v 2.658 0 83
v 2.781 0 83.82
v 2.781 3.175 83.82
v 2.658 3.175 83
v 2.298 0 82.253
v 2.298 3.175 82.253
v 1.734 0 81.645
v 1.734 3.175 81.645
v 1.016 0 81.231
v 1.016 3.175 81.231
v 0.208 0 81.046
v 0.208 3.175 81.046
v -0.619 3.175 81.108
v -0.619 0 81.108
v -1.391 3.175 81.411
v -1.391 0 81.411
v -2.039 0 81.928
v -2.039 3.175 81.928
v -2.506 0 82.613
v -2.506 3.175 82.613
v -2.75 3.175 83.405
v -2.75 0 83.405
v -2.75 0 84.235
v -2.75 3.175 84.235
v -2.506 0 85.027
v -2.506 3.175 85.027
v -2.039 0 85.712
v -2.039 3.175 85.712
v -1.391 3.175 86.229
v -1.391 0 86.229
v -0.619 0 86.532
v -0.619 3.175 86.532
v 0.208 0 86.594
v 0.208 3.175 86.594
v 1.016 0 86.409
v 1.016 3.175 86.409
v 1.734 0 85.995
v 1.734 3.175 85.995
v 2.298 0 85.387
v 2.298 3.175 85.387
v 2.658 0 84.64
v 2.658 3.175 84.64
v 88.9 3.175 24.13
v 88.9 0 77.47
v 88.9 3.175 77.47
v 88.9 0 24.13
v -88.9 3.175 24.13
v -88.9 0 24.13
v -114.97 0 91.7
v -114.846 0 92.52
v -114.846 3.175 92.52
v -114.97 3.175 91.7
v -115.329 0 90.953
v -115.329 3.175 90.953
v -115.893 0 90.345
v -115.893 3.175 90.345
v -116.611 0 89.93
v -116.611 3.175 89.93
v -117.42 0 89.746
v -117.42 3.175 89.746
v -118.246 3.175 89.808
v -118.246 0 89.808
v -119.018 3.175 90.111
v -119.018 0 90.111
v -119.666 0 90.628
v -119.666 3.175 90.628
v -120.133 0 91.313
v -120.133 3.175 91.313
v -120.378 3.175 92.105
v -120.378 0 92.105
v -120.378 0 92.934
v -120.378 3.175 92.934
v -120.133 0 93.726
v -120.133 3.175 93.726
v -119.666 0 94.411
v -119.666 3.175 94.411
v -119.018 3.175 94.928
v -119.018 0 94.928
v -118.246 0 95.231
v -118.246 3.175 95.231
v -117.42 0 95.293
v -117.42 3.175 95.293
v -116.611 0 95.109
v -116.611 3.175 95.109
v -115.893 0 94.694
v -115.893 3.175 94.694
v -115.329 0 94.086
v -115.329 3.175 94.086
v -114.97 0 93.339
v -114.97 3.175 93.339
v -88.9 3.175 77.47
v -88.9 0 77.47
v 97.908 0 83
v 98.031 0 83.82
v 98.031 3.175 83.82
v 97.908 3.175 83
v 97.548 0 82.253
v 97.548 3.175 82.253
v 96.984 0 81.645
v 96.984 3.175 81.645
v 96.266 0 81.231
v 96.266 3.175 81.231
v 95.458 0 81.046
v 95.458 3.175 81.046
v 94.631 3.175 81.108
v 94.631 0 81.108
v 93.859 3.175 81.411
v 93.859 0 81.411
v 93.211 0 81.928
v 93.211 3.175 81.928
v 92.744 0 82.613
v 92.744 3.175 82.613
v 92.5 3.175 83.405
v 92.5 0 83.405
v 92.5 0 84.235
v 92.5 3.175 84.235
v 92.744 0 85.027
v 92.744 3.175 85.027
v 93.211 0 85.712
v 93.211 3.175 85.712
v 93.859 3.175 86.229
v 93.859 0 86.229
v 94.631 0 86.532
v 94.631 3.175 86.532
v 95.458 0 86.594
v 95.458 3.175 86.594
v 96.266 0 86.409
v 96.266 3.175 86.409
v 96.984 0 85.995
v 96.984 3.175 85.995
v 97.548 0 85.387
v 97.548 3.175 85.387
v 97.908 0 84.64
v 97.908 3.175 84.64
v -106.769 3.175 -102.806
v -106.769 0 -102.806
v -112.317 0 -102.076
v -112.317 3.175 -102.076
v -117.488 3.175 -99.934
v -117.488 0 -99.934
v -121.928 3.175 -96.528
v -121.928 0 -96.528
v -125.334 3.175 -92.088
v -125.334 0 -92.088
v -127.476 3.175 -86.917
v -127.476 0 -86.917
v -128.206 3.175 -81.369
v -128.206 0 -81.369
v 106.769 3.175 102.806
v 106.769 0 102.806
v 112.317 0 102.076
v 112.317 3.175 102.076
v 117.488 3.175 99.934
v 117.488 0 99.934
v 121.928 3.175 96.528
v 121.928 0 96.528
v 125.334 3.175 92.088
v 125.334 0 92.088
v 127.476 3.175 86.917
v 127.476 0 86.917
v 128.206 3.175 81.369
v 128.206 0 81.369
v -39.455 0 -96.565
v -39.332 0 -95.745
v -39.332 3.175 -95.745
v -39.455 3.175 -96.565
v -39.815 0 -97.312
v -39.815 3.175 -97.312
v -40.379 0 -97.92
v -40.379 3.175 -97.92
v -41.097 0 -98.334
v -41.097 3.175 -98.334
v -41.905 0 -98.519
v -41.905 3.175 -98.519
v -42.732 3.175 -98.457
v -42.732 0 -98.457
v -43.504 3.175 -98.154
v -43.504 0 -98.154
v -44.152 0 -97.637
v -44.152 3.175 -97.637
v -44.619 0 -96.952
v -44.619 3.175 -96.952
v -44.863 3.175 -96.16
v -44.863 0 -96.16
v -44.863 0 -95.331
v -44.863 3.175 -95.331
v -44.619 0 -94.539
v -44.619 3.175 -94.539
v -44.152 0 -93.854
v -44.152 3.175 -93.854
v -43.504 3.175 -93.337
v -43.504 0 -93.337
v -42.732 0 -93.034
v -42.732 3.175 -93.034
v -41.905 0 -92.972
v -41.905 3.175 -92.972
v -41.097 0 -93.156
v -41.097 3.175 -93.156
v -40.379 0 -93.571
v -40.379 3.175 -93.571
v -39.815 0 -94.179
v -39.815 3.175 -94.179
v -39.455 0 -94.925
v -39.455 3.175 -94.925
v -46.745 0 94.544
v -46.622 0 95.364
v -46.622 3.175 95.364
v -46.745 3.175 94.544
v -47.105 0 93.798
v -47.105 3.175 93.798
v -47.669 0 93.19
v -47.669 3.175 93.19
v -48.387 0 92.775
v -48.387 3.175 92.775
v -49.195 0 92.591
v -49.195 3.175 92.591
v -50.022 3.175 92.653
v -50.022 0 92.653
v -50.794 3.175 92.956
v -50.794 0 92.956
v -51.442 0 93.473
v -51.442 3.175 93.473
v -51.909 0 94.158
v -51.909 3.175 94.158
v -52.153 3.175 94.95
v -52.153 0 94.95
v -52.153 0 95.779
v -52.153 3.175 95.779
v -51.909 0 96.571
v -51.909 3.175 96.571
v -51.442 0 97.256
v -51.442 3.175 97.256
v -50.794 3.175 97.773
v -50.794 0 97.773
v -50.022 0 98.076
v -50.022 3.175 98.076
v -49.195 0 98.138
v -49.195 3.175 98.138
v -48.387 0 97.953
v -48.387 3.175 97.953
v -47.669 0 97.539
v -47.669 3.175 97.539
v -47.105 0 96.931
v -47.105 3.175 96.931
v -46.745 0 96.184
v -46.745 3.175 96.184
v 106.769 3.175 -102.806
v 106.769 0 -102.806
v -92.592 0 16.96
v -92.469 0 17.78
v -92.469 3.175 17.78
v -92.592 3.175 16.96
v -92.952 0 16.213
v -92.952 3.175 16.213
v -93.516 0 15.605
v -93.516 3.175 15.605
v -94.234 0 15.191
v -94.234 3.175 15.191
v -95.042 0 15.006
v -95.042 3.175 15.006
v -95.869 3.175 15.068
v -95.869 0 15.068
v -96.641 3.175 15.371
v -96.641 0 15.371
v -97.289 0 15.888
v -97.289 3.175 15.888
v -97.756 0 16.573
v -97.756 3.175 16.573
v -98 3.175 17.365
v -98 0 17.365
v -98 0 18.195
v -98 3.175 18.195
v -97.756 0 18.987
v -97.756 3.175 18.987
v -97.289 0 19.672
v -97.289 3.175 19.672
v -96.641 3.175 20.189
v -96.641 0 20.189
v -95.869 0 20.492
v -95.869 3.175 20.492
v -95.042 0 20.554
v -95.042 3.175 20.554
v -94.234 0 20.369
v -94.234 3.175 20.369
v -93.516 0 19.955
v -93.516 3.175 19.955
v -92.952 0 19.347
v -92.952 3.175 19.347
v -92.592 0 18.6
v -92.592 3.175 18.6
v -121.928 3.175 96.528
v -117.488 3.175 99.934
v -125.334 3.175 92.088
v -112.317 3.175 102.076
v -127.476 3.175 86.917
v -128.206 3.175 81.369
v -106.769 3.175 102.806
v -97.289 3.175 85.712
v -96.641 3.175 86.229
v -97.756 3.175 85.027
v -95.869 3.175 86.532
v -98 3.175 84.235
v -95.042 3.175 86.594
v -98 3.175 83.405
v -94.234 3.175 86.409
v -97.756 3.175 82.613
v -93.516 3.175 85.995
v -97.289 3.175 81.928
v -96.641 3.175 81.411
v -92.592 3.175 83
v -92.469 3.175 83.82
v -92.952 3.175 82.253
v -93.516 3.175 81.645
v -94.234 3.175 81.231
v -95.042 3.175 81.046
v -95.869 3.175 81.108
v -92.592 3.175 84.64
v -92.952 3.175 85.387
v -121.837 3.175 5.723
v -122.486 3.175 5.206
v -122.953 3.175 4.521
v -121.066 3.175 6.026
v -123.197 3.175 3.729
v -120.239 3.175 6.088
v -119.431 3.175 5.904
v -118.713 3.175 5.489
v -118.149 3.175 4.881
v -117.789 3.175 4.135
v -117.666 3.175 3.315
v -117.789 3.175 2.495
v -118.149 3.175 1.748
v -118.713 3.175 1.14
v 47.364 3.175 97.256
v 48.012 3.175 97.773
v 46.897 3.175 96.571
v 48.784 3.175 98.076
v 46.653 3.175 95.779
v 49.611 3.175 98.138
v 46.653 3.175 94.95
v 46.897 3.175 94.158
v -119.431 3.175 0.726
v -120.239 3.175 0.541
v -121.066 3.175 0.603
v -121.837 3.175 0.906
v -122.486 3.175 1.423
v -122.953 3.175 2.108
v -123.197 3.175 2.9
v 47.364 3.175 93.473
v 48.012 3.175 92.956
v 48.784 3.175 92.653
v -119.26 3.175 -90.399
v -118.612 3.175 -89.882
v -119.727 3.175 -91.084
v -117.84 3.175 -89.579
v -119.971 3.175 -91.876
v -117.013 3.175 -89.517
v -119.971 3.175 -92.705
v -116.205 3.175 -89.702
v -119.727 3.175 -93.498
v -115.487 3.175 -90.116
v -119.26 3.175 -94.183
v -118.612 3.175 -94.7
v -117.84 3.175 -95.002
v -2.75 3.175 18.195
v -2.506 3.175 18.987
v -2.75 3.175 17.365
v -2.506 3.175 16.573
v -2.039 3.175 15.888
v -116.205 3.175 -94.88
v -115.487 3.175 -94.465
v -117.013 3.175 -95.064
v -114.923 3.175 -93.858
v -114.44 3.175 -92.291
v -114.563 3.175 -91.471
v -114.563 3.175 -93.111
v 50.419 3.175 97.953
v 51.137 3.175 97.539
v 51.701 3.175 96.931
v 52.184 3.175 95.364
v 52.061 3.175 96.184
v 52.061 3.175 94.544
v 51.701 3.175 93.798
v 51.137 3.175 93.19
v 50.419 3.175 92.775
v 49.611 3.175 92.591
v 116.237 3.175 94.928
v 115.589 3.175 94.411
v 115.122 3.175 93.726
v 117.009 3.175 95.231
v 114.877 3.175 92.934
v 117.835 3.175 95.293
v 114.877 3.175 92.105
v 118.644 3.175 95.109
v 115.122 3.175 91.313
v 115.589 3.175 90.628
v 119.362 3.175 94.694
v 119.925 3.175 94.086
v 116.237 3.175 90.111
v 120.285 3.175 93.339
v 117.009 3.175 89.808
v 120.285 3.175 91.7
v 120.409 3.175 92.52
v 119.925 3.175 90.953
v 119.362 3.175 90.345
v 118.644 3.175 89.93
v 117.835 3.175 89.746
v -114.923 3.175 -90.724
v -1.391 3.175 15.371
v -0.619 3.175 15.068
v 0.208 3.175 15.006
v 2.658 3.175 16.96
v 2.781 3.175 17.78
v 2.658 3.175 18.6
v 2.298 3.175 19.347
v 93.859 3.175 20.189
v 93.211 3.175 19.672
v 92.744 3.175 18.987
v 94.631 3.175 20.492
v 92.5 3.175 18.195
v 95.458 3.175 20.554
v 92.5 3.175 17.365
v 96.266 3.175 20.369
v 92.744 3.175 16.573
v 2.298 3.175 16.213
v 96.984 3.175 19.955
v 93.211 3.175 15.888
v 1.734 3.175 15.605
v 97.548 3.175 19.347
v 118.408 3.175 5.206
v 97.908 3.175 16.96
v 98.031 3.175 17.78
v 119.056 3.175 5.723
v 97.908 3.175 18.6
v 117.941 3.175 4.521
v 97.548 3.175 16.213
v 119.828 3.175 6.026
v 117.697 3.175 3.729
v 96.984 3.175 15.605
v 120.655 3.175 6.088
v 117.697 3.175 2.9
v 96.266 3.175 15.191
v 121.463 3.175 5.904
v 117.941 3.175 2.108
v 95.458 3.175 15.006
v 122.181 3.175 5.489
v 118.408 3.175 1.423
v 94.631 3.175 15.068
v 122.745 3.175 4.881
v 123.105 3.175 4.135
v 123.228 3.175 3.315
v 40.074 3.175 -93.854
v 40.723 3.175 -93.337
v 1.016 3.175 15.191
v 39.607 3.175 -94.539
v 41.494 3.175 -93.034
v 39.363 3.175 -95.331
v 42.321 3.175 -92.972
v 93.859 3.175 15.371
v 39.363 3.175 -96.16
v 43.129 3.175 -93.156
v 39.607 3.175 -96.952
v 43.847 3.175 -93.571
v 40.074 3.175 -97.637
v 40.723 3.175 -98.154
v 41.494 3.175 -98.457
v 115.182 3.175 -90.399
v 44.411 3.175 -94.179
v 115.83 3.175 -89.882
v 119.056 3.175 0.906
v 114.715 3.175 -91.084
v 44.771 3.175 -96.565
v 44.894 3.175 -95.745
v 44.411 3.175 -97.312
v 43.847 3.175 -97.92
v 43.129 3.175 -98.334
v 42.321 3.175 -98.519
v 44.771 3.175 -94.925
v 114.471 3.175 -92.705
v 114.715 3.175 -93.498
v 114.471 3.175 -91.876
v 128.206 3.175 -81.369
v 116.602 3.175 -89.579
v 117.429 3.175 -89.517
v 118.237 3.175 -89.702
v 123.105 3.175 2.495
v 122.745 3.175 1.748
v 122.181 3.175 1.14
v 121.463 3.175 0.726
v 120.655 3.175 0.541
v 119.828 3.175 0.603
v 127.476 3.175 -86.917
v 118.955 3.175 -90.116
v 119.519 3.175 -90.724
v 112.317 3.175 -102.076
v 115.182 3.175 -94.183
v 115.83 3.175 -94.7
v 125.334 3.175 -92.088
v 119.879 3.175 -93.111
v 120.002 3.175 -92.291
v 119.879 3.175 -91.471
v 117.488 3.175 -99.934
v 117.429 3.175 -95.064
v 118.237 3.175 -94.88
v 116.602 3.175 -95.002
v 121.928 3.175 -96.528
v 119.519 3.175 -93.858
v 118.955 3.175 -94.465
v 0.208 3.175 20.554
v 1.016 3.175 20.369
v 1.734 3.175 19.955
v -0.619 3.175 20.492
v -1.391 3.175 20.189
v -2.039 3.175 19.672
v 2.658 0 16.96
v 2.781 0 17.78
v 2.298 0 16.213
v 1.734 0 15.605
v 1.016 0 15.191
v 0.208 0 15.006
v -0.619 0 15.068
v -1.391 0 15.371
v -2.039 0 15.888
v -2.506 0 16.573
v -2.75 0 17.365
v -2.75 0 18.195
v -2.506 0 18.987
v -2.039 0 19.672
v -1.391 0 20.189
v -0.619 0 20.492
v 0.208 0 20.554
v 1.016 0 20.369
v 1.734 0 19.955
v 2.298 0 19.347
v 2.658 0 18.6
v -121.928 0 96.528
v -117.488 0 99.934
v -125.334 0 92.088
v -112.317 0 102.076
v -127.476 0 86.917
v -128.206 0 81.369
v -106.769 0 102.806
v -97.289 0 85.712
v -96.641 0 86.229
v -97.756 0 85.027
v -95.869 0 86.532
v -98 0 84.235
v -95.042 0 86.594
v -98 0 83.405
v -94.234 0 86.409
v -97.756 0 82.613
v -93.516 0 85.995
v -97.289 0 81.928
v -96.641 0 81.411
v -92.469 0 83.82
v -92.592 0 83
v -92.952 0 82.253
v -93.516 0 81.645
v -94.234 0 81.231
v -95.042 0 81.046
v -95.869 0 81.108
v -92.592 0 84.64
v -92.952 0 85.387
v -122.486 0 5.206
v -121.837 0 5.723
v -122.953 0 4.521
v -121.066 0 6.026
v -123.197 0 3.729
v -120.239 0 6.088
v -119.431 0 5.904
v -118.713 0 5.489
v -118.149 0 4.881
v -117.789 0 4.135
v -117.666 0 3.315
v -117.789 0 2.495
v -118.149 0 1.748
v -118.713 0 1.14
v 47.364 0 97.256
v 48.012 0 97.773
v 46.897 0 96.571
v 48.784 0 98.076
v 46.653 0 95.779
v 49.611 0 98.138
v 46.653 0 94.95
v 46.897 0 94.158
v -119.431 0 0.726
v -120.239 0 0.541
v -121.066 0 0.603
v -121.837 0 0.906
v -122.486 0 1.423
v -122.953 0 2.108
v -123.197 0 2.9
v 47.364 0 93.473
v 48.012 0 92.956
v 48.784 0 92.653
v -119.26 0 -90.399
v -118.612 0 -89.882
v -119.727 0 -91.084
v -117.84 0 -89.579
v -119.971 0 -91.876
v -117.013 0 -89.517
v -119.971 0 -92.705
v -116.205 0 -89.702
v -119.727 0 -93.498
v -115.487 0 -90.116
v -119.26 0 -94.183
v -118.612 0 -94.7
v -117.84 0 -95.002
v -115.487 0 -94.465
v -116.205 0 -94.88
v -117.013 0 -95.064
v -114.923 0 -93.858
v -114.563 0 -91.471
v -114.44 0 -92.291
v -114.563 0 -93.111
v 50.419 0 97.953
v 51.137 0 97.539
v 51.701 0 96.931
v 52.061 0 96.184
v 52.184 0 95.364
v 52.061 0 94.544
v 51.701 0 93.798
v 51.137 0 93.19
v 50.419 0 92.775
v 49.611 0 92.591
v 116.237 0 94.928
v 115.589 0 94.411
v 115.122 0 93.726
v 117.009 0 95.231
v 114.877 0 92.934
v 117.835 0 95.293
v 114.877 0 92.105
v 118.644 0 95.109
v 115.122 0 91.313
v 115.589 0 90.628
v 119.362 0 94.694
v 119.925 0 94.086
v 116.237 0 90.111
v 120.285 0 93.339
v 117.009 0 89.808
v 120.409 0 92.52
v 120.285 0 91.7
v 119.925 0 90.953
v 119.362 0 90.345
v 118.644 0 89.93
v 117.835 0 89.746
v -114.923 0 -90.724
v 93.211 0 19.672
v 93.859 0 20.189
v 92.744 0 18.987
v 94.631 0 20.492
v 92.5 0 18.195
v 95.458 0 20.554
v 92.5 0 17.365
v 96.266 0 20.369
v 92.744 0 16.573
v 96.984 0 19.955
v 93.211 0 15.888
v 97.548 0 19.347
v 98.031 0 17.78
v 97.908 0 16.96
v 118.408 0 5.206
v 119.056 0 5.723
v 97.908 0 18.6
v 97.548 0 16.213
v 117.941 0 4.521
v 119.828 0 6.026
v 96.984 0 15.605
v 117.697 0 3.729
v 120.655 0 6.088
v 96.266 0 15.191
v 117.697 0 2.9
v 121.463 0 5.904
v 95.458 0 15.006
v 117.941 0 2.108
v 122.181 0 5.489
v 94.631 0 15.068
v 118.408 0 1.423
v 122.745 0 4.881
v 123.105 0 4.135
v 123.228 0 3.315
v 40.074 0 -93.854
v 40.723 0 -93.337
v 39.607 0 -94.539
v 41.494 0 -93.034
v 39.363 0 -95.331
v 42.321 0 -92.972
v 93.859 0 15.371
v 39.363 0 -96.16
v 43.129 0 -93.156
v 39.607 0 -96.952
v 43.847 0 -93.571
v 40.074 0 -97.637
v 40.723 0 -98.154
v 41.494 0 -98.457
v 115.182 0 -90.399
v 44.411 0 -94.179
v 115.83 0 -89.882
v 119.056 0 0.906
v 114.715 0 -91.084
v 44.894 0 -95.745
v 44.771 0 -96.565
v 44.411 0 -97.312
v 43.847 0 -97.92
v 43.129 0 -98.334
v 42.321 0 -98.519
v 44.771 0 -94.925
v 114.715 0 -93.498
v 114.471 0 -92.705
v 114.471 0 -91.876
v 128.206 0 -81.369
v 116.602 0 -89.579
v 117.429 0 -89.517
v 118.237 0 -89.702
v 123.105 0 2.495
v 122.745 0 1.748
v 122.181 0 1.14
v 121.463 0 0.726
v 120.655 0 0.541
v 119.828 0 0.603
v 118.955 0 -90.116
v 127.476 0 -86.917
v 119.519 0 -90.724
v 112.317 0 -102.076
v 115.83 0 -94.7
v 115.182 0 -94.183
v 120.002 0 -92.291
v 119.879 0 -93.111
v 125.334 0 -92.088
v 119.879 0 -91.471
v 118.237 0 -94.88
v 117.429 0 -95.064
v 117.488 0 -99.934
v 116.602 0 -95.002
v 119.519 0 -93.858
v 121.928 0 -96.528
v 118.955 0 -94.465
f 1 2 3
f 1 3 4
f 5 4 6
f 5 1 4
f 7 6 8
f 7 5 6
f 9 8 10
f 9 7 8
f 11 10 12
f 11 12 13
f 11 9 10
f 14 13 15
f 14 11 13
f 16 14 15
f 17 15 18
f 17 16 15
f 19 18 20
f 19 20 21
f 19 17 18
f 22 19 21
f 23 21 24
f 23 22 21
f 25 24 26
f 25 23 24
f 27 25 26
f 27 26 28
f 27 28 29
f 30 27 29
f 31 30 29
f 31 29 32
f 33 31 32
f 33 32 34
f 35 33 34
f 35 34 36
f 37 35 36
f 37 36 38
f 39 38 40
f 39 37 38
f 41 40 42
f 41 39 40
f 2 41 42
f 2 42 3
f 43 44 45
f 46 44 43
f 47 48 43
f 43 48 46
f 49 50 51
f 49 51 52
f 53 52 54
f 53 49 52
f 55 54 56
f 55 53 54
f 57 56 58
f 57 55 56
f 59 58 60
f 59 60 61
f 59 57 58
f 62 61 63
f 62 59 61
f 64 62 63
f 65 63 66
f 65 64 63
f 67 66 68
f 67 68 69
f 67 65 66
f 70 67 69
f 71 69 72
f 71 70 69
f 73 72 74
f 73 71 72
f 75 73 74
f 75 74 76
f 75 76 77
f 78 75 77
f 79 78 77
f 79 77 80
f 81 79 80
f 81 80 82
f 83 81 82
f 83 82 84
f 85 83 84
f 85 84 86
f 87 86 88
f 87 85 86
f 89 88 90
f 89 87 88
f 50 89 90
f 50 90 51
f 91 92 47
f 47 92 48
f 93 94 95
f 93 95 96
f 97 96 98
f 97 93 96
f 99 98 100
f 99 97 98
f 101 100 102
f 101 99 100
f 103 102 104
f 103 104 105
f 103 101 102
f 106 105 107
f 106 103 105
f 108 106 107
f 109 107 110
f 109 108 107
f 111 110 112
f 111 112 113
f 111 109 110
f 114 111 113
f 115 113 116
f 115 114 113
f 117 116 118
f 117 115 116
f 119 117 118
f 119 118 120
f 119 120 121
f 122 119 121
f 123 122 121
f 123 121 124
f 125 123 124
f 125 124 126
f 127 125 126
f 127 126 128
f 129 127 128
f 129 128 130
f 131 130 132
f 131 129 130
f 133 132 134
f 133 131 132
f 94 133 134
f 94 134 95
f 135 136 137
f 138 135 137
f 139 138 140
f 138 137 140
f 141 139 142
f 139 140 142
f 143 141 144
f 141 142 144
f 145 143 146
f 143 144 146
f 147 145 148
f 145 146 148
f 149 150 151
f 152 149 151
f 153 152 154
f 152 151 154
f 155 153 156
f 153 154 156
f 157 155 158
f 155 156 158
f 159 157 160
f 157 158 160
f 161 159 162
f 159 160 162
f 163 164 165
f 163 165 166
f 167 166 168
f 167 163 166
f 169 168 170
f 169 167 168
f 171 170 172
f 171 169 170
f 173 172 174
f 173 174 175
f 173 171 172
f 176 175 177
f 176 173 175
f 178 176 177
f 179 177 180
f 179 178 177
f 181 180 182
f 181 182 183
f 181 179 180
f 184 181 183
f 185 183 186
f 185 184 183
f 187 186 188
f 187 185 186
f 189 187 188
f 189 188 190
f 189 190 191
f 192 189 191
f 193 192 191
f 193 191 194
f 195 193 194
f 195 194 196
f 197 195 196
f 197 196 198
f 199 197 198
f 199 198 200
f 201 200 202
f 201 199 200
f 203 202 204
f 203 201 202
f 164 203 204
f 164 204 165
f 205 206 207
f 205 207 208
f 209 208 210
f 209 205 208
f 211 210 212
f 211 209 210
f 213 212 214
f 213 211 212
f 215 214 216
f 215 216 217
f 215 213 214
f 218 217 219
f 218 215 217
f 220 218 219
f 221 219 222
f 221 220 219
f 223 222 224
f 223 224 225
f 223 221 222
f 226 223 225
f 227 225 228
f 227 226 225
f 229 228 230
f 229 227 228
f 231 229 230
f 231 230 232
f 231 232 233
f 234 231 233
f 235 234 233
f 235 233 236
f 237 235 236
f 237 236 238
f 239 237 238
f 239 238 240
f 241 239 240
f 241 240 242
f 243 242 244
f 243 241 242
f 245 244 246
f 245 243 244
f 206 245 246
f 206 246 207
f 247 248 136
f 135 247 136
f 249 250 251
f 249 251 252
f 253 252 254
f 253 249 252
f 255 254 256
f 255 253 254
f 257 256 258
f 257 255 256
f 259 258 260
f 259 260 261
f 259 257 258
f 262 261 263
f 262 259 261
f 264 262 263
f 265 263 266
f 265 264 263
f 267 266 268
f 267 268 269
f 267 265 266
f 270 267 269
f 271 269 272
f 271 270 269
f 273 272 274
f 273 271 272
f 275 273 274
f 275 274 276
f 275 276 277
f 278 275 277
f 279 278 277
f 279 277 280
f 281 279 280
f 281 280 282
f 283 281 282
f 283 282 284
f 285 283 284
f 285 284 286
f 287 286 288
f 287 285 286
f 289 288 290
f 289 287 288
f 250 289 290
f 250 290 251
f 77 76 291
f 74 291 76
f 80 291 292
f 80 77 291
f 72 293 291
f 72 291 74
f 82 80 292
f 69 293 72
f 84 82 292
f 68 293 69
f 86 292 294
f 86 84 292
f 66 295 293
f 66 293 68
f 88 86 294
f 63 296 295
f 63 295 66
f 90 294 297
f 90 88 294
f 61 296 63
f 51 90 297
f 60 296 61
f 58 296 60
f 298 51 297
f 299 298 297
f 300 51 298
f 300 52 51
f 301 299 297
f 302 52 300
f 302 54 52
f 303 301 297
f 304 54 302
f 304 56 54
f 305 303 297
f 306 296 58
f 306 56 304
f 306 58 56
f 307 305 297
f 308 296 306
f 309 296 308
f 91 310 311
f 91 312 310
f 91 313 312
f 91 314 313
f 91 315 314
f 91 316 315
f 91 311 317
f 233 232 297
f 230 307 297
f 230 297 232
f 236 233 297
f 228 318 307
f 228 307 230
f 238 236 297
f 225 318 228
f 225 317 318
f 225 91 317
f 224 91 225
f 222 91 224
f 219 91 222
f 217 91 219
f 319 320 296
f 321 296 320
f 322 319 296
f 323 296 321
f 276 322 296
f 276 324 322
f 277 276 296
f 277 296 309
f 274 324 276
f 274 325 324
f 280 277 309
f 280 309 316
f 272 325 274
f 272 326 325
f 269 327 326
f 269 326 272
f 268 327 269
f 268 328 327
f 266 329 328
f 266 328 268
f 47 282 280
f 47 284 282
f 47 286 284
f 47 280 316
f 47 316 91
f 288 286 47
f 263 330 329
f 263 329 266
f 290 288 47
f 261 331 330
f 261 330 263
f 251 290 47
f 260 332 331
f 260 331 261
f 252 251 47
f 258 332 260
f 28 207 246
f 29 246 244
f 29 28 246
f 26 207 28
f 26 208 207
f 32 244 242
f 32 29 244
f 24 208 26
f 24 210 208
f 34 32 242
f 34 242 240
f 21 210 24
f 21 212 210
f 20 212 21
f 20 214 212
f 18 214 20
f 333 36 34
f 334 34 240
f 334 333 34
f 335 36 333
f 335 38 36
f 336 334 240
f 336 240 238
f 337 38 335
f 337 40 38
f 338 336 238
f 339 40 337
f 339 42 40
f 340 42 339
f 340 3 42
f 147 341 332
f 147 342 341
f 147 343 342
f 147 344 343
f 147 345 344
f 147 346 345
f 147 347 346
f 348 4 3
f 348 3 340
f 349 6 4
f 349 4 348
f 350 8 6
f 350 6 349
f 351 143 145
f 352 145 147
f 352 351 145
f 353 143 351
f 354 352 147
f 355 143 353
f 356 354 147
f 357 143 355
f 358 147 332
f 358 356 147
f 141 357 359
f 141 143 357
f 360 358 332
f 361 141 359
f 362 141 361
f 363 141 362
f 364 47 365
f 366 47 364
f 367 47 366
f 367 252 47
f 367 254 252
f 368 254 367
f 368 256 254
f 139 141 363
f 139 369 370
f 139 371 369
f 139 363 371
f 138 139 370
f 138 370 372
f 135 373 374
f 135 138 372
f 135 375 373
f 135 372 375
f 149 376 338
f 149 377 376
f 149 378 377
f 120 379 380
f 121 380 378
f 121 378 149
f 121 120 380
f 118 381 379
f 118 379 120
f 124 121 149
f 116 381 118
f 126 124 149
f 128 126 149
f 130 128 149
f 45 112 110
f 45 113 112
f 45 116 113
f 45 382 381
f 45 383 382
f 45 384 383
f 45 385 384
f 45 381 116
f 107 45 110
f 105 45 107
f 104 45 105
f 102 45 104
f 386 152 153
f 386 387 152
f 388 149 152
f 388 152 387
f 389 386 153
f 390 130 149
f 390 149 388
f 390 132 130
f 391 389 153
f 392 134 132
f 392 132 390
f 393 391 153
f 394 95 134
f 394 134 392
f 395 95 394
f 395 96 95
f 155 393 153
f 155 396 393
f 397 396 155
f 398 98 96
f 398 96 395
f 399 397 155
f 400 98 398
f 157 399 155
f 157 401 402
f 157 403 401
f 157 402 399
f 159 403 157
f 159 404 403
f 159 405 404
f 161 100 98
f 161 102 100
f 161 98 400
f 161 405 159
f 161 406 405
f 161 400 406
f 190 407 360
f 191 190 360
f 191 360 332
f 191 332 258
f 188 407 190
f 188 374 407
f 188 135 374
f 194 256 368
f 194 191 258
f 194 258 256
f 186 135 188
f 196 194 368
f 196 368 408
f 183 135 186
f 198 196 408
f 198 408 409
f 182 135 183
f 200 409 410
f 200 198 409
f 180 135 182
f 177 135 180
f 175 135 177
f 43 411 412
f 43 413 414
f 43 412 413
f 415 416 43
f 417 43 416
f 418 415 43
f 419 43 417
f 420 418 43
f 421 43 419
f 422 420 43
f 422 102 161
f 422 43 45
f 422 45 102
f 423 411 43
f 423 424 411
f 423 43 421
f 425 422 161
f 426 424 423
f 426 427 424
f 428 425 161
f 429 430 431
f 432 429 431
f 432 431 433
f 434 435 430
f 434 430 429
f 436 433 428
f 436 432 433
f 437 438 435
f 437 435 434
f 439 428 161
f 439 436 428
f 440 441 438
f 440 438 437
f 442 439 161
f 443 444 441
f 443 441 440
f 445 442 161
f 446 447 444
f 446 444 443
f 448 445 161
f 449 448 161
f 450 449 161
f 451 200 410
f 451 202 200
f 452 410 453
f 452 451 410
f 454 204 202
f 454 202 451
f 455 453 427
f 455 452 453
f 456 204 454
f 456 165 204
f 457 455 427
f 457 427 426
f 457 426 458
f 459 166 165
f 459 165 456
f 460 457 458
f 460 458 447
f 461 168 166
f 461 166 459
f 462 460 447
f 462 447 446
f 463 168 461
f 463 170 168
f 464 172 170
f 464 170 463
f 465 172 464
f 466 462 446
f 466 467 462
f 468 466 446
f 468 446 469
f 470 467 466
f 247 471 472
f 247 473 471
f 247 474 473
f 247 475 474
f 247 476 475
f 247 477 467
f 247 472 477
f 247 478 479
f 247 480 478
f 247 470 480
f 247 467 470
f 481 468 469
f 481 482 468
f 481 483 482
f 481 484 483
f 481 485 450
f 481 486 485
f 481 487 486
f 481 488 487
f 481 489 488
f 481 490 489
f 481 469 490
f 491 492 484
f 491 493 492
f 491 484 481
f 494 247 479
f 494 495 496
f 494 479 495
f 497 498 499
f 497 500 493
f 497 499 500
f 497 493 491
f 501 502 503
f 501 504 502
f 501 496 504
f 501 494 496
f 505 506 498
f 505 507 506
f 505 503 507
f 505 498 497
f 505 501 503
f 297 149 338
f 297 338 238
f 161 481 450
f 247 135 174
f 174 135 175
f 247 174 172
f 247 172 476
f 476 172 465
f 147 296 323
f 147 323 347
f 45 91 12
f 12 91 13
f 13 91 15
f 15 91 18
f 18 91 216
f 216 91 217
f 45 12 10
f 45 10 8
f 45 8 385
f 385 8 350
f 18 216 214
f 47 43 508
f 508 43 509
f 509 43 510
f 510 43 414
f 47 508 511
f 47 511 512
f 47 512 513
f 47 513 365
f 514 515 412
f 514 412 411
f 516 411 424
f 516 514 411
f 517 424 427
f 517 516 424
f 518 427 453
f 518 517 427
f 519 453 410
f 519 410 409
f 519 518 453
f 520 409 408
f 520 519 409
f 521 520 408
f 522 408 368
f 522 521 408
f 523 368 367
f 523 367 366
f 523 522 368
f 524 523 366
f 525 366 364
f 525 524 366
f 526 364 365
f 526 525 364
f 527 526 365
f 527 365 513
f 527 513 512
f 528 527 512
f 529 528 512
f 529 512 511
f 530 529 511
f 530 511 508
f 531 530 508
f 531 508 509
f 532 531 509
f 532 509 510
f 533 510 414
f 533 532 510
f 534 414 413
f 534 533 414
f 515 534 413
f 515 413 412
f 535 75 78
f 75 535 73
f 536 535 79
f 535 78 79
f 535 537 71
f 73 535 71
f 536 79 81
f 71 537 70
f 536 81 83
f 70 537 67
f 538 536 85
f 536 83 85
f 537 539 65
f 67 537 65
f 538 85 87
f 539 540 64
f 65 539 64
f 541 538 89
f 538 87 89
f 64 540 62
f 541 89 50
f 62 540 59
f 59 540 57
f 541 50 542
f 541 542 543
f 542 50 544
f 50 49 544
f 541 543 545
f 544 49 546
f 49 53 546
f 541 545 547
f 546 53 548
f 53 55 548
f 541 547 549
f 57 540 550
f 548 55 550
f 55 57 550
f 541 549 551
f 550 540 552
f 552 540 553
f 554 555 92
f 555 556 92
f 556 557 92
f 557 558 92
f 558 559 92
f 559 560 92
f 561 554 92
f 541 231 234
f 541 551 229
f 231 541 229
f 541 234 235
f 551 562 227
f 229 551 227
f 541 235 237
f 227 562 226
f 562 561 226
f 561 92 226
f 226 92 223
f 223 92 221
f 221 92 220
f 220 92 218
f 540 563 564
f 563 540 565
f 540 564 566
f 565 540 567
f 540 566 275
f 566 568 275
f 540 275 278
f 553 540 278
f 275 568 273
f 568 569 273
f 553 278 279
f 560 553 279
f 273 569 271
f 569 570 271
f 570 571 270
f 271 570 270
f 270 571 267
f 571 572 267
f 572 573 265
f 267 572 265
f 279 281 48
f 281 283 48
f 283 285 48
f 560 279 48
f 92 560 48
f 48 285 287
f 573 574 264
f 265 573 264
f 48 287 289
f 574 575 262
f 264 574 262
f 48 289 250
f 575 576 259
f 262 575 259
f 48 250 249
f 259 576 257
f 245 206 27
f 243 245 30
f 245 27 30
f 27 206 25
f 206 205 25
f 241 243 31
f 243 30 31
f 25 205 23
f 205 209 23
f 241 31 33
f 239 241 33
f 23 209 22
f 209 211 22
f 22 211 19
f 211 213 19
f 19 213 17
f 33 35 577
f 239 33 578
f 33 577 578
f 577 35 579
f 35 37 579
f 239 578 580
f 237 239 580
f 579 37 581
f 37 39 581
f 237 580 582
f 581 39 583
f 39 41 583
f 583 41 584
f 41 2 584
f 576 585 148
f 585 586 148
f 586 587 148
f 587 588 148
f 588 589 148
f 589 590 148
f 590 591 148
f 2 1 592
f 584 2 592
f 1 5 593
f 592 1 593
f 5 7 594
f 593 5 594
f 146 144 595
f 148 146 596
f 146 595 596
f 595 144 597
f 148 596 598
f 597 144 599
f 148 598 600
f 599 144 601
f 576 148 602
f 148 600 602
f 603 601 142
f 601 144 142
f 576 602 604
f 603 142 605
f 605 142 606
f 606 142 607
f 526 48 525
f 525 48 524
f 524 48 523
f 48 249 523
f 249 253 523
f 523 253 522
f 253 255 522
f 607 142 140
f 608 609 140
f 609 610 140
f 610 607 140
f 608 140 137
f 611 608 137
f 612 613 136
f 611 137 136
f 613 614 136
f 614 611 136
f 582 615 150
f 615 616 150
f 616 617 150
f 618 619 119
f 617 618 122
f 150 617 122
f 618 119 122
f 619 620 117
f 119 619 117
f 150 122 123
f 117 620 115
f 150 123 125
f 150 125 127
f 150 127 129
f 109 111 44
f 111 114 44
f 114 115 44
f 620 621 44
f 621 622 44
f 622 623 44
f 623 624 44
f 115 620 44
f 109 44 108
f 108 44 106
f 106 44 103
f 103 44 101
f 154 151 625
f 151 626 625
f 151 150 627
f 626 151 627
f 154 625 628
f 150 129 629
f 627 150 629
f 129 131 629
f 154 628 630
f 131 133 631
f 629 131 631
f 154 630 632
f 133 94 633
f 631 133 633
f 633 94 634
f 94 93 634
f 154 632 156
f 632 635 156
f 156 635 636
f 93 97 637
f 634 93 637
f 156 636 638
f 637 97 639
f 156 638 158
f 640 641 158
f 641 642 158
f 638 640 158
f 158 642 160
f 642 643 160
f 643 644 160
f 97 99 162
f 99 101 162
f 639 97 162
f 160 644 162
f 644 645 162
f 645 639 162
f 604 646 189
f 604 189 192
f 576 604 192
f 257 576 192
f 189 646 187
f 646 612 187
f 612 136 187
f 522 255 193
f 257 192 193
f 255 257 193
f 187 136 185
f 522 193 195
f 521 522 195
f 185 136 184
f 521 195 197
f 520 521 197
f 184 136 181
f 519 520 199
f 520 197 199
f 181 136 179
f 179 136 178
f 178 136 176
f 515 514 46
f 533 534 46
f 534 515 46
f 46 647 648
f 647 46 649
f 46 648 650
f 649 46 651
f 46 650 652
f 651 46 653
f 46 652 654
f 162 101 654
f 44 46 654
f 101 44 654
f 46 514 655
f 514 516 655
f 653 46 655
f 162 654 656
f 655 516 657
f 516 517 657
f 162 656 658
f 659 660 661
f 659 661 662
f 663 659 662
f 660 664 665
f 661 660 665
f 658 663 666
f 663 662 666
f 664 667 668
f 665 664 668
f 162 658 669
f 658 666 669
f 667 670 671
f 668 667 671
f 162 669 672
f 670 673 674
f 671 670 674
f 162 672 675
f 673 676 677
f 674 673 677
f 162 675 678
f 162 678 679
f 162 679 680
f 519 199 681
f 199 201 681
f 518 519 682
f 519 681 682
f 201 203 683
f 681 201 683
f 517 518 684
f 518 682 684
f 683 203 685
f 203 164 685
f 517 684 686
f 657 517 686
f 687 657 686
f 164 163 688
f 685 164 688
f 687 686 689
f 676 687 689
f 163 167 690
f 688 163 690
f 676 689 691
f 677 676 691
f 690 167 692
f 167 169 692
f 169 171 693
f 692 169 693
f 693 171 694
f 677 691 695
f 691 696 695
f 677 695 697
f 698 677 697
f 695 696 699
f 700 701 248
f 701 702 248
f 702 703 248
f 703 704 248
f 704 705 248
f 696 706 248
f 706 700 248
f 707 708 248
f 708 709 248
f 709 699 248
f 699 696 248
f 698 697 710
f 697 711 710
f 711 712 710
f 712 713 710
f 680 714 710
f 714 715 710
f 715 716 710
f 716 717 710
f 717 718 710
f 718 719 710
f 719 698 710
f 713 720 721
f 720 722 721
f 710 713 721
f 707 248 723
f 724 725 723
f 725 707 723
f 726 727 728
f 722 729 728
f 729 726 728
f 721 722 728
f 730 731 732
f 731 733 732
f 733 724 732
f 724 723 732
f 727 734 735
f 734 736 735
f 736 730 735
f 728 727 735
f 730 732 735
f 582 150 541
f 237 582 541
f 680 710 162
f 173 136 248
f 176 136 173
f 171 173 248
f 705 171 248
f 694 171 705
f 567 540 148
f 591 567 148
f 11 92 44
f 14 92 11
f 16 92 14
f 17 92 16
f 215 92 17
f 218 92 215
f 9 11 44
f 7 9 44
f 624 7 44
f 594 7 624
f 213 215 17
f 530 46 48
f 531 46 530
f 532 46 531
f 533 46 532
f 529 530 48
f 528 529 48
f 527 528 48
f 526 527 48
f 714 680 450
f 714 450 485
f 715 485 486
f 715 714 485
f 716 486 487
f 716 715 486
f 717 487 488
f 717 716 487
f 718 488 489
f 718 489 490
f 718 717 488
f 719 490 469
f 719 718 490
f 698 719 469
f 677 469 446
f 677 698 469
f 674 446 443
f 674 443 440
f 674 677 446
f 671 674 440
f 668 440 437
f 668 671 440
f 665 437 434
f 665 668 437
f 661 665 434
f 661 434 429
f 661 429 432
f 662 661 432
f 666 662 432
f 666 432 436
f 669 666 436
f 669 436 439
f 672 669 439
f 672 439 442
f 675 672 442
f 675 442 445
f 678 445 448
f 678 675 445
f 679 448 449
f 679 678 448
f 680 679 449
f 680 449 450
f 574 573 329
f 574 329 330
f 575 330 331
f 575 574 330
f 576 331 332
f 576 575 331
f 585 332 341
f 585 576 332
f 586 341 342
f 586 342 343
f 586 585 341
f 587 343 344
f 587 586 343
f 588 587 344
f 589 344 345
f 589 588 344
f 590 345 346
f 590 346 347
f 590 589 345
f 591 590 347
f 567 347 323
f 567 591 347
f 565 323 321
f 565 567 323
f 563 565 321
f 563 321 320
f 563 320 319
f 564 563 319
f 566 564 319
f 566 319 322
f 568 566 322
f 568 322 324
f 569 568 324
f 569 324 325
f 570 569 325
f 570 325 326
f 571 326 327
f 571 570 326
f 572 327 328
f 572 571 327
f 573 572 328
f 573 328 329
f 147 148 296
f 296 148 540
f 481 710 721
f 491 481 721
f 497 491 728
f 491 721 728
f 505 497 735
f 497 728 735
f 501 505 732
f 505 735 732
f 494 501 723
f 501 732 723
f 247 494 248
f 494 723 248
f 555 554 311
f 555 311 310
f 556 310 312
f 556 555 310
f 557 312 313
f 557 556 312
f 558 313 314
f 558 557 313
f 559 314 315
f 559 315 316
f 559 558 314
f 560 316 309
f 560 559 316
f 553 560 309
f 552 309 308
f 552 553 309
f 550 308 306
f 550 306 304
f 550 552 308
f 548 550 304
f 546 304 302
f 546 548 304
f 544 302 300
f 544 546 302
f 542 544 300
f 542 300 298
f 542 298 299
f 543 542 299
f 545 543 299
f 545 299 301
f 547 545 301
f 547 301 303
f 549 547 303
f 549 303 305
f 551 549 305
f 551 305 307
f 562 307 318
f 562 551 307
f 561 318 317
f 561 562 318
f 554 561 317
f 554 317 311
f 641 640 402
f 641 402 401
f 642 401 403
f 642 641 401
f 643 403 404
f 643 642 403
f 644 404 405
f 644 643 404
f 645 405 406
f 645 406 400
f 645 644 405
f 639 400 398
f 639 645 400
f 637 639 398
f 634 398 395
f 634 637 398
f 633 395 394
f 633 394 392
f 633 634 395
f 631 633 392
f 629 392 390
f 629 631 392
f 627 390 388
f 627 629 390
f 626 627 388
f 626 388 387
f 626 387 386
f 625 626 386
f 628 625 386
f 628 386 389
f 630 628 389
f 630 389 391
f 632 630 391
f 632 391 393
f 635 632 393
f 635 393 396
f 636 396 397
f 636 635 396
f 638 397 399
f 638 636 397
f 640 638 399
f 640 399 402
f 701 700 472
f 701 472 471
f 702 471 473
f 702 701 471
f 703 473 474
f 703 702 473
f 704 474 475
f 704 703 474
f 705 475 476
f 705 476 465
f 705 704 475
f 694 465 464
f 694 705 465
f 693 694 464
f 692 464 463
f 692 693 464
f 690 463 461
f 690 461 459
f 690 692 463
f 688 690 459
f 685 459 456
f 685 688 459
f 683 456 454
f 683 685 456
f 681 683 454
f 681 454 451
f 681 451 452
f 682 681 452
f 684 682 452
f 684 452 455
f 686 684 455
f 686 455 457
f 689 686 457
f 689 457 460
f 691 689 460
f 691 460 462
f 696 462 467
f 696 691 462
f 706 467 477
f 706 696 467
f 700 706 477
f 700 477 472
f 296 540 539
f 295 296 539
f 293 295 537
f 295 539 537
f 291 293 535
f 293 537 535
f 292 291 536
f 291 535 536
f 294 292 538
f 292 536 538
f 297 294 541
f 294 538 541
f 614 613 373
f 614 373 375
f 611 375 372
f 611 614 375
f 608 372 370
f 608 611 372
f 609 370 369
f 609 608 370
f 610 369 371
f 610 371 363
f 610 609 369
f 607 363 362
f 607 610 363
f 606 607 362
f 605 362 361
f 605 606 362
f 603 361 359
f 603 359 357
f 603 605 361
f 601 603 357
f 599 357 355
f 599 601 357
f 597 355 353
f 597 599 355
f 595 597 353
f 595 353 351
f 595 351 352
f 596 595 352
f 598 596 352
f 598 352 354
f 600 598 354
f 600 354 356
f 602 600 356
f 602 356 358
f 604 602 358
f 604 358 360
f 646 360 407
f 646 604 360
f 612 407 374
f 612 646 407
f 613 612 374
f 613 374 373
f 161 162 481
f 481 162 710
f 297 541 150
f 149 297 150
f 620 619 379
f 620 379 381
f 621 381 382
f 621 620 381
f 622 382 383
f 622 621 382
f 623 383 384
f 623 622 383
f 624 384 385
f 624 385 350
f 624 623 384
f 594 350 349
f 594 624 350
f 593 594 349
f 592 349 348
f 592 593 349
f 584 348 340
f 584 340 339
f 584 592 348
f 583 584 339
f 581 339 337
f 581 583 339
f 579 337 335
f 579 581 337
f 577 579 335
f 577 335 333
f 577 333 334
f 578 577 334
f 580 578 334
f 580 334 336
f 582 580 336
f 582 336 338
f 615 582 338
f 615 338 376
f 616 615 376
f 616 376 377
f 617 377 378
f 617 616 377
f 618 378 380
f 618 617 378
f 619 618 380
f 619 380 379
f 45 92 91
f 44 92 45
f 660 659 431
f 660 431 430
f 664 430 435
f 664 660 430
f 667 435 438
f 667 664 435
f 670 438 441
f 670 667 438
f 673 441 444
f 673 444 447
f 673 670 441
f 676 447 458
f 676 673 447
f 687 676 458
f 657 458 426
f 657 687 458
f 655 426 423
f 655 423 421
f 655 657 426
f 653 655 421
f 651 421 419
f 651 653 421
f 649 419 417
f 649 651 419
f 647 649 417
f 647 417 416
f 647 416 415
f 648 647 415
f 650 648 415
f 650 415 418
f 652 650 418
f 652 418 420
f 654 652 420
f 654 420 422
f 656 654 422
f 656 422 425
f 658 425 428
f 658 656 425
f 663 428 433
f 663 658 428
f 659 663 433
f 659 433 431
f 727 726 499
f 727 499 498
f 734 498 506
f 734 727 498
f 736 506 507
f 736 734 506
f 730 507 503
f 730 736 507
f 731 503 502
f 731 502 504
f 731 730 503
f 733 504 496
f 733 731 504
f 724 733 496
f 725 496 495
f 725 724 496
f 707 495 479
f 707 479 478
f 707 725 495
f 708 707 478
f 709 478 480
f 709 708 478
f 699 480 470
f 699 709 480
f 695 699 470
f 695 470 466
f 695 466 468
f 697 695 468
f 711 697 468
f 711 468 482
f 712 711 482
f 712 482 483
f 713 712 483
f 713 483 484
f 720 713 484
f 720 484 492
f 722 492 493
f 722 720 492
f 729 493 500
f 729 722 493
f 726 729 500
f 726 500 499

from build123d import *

# Parameters (mm, degrees)
SKETCH2_R           = 2.7813
BOSS_EXTRUDE1_DEPTH = 3.175
SKETCH3_W           = 177.8
SKETCH3_H           = 53.34
CUT_EXTRUDE1_DEPTH  = 3.175
SKETCH4_R           = 2.7813
CUT_EXTRUDE2_DEPTH  = 3.175


with BuildPart() as part:
    # Sketch2 → Boss-Extrude1 (new body)
    with BuildSketch(Plane(origin=(0, 0, 0), x_dir=(1, 0, 0), z_dir=(0, 1, 0))):
        with BuildLine():
            Line((-106.7689, -102.8065), (106.7689, -102.8065))
            ThreePointArc((106.7689, -102.8065), (121.927572332, -96.527572332), (128.2065, -81.3689))
            Line((128.2065, -81.3689), (128.2065, 81.3689))
            ThreePointArc((128.2065, 81.3689), (121.927572332, 96.527572332), (106.7689, 102.8065))
            Line((106.7689, 102.8065), (-106.7689, 102.8065))
            ThreePointArc((-106.7689, 102.8065), (-121.927572332, 96.527572332), (-128.2065, 81.3689))
            Line((-128.2065, 81.3689), (-128.2065, -81.3689))
            ThreePointArc((-128.2065, -81.3689), (-121.927572332, -96.527572332), (-106.7689, -102.8065))
        make_face()
        with Locations((42.1132, 95.7453)):
            Circle(SKETCH2_R, mode=Mode.SUBTRACT)
        with Locations((117.221, 92.2909)):
            Circle(SKETCH2_R, mode=Mode.SUBTRACT)
        with Locations((120.4468, -3.3147)):
            Circle(SKETCH2_R, mode=Mode.SUBTRACT)
        with Locations((117.6274, -92.5195)):
            Circle(SKETCH2_R, mode=Mode.SUBTRACT)
        with Locations((49.403, -95.3643)):
            Circle(SKETCH2_R, mode=Mode.SUBTRACT)
        with Locations((-49.403, -95.3643)):
            Circle(SKETCH2_R, mode=Mode.SUBTRACT)
        with Locations((-117.6274, -92.5195)):
            Circle(SKETCH2_R, mode=Mode.SUBTRACT)
        with Locations((-120.4468, -3.3147)):
            Circle(SKETCH2_R, mode=Mode.SUBTRACT)
        with Locations((-117.221, 92.2909)):
            Circle(SKETCH2_R, mode=Mode.SUBTRACT)
        with Locations((-42.1132, 95.7453)):
            Circle(SKETCH2_R, mode=Mode.SUBTRACT)
    extrude(amount=BOSS_EXTRUDE1_DEPTH)

    # Sketch3 → Cut-Extrude1 (cut)
    with BuildSketch(Plane(origin=(0, 0, 0), x_dir=(1, 0, 0), z_dir=(0, 1, 0))):
        with Locations((0, -50.8)):
            Rectangle(SKETCH3_W, SKETCH3_H)
    extrude(amount=CUT_EXTRUDE1_DEPTH, mode=Mode.SUBTRACT)

    # Sketch4 → Cut-Extrude2 (cut)
    with BuildSketch(Plane(origin=(0, 0, 0), x_dir=(1, 0, 0), z_dir=(0, 1, 0))):
        with Locations((-95.25, -17.78)):
            Circle(SKETCH4_R)
        with Locations((0, -17.78)):
            Circle(SKETCH4_R)
        with Locations((95.25, -17.78)):
            Circle(SKETCH4_R)
        with Locations((95.25, -83.82)):
            Circle(SKETCH4_R)
        with Locations((0, -83.82)):
            Circle(SKETCH4_R)
        with Locations((-95.25, -83.82)):
            Circle(SKETCH4_R)
    extrude(amount=CUT_EXTRUDE2_DEPTH, mode=Mode.SUBTRACT)


solid = part.part
